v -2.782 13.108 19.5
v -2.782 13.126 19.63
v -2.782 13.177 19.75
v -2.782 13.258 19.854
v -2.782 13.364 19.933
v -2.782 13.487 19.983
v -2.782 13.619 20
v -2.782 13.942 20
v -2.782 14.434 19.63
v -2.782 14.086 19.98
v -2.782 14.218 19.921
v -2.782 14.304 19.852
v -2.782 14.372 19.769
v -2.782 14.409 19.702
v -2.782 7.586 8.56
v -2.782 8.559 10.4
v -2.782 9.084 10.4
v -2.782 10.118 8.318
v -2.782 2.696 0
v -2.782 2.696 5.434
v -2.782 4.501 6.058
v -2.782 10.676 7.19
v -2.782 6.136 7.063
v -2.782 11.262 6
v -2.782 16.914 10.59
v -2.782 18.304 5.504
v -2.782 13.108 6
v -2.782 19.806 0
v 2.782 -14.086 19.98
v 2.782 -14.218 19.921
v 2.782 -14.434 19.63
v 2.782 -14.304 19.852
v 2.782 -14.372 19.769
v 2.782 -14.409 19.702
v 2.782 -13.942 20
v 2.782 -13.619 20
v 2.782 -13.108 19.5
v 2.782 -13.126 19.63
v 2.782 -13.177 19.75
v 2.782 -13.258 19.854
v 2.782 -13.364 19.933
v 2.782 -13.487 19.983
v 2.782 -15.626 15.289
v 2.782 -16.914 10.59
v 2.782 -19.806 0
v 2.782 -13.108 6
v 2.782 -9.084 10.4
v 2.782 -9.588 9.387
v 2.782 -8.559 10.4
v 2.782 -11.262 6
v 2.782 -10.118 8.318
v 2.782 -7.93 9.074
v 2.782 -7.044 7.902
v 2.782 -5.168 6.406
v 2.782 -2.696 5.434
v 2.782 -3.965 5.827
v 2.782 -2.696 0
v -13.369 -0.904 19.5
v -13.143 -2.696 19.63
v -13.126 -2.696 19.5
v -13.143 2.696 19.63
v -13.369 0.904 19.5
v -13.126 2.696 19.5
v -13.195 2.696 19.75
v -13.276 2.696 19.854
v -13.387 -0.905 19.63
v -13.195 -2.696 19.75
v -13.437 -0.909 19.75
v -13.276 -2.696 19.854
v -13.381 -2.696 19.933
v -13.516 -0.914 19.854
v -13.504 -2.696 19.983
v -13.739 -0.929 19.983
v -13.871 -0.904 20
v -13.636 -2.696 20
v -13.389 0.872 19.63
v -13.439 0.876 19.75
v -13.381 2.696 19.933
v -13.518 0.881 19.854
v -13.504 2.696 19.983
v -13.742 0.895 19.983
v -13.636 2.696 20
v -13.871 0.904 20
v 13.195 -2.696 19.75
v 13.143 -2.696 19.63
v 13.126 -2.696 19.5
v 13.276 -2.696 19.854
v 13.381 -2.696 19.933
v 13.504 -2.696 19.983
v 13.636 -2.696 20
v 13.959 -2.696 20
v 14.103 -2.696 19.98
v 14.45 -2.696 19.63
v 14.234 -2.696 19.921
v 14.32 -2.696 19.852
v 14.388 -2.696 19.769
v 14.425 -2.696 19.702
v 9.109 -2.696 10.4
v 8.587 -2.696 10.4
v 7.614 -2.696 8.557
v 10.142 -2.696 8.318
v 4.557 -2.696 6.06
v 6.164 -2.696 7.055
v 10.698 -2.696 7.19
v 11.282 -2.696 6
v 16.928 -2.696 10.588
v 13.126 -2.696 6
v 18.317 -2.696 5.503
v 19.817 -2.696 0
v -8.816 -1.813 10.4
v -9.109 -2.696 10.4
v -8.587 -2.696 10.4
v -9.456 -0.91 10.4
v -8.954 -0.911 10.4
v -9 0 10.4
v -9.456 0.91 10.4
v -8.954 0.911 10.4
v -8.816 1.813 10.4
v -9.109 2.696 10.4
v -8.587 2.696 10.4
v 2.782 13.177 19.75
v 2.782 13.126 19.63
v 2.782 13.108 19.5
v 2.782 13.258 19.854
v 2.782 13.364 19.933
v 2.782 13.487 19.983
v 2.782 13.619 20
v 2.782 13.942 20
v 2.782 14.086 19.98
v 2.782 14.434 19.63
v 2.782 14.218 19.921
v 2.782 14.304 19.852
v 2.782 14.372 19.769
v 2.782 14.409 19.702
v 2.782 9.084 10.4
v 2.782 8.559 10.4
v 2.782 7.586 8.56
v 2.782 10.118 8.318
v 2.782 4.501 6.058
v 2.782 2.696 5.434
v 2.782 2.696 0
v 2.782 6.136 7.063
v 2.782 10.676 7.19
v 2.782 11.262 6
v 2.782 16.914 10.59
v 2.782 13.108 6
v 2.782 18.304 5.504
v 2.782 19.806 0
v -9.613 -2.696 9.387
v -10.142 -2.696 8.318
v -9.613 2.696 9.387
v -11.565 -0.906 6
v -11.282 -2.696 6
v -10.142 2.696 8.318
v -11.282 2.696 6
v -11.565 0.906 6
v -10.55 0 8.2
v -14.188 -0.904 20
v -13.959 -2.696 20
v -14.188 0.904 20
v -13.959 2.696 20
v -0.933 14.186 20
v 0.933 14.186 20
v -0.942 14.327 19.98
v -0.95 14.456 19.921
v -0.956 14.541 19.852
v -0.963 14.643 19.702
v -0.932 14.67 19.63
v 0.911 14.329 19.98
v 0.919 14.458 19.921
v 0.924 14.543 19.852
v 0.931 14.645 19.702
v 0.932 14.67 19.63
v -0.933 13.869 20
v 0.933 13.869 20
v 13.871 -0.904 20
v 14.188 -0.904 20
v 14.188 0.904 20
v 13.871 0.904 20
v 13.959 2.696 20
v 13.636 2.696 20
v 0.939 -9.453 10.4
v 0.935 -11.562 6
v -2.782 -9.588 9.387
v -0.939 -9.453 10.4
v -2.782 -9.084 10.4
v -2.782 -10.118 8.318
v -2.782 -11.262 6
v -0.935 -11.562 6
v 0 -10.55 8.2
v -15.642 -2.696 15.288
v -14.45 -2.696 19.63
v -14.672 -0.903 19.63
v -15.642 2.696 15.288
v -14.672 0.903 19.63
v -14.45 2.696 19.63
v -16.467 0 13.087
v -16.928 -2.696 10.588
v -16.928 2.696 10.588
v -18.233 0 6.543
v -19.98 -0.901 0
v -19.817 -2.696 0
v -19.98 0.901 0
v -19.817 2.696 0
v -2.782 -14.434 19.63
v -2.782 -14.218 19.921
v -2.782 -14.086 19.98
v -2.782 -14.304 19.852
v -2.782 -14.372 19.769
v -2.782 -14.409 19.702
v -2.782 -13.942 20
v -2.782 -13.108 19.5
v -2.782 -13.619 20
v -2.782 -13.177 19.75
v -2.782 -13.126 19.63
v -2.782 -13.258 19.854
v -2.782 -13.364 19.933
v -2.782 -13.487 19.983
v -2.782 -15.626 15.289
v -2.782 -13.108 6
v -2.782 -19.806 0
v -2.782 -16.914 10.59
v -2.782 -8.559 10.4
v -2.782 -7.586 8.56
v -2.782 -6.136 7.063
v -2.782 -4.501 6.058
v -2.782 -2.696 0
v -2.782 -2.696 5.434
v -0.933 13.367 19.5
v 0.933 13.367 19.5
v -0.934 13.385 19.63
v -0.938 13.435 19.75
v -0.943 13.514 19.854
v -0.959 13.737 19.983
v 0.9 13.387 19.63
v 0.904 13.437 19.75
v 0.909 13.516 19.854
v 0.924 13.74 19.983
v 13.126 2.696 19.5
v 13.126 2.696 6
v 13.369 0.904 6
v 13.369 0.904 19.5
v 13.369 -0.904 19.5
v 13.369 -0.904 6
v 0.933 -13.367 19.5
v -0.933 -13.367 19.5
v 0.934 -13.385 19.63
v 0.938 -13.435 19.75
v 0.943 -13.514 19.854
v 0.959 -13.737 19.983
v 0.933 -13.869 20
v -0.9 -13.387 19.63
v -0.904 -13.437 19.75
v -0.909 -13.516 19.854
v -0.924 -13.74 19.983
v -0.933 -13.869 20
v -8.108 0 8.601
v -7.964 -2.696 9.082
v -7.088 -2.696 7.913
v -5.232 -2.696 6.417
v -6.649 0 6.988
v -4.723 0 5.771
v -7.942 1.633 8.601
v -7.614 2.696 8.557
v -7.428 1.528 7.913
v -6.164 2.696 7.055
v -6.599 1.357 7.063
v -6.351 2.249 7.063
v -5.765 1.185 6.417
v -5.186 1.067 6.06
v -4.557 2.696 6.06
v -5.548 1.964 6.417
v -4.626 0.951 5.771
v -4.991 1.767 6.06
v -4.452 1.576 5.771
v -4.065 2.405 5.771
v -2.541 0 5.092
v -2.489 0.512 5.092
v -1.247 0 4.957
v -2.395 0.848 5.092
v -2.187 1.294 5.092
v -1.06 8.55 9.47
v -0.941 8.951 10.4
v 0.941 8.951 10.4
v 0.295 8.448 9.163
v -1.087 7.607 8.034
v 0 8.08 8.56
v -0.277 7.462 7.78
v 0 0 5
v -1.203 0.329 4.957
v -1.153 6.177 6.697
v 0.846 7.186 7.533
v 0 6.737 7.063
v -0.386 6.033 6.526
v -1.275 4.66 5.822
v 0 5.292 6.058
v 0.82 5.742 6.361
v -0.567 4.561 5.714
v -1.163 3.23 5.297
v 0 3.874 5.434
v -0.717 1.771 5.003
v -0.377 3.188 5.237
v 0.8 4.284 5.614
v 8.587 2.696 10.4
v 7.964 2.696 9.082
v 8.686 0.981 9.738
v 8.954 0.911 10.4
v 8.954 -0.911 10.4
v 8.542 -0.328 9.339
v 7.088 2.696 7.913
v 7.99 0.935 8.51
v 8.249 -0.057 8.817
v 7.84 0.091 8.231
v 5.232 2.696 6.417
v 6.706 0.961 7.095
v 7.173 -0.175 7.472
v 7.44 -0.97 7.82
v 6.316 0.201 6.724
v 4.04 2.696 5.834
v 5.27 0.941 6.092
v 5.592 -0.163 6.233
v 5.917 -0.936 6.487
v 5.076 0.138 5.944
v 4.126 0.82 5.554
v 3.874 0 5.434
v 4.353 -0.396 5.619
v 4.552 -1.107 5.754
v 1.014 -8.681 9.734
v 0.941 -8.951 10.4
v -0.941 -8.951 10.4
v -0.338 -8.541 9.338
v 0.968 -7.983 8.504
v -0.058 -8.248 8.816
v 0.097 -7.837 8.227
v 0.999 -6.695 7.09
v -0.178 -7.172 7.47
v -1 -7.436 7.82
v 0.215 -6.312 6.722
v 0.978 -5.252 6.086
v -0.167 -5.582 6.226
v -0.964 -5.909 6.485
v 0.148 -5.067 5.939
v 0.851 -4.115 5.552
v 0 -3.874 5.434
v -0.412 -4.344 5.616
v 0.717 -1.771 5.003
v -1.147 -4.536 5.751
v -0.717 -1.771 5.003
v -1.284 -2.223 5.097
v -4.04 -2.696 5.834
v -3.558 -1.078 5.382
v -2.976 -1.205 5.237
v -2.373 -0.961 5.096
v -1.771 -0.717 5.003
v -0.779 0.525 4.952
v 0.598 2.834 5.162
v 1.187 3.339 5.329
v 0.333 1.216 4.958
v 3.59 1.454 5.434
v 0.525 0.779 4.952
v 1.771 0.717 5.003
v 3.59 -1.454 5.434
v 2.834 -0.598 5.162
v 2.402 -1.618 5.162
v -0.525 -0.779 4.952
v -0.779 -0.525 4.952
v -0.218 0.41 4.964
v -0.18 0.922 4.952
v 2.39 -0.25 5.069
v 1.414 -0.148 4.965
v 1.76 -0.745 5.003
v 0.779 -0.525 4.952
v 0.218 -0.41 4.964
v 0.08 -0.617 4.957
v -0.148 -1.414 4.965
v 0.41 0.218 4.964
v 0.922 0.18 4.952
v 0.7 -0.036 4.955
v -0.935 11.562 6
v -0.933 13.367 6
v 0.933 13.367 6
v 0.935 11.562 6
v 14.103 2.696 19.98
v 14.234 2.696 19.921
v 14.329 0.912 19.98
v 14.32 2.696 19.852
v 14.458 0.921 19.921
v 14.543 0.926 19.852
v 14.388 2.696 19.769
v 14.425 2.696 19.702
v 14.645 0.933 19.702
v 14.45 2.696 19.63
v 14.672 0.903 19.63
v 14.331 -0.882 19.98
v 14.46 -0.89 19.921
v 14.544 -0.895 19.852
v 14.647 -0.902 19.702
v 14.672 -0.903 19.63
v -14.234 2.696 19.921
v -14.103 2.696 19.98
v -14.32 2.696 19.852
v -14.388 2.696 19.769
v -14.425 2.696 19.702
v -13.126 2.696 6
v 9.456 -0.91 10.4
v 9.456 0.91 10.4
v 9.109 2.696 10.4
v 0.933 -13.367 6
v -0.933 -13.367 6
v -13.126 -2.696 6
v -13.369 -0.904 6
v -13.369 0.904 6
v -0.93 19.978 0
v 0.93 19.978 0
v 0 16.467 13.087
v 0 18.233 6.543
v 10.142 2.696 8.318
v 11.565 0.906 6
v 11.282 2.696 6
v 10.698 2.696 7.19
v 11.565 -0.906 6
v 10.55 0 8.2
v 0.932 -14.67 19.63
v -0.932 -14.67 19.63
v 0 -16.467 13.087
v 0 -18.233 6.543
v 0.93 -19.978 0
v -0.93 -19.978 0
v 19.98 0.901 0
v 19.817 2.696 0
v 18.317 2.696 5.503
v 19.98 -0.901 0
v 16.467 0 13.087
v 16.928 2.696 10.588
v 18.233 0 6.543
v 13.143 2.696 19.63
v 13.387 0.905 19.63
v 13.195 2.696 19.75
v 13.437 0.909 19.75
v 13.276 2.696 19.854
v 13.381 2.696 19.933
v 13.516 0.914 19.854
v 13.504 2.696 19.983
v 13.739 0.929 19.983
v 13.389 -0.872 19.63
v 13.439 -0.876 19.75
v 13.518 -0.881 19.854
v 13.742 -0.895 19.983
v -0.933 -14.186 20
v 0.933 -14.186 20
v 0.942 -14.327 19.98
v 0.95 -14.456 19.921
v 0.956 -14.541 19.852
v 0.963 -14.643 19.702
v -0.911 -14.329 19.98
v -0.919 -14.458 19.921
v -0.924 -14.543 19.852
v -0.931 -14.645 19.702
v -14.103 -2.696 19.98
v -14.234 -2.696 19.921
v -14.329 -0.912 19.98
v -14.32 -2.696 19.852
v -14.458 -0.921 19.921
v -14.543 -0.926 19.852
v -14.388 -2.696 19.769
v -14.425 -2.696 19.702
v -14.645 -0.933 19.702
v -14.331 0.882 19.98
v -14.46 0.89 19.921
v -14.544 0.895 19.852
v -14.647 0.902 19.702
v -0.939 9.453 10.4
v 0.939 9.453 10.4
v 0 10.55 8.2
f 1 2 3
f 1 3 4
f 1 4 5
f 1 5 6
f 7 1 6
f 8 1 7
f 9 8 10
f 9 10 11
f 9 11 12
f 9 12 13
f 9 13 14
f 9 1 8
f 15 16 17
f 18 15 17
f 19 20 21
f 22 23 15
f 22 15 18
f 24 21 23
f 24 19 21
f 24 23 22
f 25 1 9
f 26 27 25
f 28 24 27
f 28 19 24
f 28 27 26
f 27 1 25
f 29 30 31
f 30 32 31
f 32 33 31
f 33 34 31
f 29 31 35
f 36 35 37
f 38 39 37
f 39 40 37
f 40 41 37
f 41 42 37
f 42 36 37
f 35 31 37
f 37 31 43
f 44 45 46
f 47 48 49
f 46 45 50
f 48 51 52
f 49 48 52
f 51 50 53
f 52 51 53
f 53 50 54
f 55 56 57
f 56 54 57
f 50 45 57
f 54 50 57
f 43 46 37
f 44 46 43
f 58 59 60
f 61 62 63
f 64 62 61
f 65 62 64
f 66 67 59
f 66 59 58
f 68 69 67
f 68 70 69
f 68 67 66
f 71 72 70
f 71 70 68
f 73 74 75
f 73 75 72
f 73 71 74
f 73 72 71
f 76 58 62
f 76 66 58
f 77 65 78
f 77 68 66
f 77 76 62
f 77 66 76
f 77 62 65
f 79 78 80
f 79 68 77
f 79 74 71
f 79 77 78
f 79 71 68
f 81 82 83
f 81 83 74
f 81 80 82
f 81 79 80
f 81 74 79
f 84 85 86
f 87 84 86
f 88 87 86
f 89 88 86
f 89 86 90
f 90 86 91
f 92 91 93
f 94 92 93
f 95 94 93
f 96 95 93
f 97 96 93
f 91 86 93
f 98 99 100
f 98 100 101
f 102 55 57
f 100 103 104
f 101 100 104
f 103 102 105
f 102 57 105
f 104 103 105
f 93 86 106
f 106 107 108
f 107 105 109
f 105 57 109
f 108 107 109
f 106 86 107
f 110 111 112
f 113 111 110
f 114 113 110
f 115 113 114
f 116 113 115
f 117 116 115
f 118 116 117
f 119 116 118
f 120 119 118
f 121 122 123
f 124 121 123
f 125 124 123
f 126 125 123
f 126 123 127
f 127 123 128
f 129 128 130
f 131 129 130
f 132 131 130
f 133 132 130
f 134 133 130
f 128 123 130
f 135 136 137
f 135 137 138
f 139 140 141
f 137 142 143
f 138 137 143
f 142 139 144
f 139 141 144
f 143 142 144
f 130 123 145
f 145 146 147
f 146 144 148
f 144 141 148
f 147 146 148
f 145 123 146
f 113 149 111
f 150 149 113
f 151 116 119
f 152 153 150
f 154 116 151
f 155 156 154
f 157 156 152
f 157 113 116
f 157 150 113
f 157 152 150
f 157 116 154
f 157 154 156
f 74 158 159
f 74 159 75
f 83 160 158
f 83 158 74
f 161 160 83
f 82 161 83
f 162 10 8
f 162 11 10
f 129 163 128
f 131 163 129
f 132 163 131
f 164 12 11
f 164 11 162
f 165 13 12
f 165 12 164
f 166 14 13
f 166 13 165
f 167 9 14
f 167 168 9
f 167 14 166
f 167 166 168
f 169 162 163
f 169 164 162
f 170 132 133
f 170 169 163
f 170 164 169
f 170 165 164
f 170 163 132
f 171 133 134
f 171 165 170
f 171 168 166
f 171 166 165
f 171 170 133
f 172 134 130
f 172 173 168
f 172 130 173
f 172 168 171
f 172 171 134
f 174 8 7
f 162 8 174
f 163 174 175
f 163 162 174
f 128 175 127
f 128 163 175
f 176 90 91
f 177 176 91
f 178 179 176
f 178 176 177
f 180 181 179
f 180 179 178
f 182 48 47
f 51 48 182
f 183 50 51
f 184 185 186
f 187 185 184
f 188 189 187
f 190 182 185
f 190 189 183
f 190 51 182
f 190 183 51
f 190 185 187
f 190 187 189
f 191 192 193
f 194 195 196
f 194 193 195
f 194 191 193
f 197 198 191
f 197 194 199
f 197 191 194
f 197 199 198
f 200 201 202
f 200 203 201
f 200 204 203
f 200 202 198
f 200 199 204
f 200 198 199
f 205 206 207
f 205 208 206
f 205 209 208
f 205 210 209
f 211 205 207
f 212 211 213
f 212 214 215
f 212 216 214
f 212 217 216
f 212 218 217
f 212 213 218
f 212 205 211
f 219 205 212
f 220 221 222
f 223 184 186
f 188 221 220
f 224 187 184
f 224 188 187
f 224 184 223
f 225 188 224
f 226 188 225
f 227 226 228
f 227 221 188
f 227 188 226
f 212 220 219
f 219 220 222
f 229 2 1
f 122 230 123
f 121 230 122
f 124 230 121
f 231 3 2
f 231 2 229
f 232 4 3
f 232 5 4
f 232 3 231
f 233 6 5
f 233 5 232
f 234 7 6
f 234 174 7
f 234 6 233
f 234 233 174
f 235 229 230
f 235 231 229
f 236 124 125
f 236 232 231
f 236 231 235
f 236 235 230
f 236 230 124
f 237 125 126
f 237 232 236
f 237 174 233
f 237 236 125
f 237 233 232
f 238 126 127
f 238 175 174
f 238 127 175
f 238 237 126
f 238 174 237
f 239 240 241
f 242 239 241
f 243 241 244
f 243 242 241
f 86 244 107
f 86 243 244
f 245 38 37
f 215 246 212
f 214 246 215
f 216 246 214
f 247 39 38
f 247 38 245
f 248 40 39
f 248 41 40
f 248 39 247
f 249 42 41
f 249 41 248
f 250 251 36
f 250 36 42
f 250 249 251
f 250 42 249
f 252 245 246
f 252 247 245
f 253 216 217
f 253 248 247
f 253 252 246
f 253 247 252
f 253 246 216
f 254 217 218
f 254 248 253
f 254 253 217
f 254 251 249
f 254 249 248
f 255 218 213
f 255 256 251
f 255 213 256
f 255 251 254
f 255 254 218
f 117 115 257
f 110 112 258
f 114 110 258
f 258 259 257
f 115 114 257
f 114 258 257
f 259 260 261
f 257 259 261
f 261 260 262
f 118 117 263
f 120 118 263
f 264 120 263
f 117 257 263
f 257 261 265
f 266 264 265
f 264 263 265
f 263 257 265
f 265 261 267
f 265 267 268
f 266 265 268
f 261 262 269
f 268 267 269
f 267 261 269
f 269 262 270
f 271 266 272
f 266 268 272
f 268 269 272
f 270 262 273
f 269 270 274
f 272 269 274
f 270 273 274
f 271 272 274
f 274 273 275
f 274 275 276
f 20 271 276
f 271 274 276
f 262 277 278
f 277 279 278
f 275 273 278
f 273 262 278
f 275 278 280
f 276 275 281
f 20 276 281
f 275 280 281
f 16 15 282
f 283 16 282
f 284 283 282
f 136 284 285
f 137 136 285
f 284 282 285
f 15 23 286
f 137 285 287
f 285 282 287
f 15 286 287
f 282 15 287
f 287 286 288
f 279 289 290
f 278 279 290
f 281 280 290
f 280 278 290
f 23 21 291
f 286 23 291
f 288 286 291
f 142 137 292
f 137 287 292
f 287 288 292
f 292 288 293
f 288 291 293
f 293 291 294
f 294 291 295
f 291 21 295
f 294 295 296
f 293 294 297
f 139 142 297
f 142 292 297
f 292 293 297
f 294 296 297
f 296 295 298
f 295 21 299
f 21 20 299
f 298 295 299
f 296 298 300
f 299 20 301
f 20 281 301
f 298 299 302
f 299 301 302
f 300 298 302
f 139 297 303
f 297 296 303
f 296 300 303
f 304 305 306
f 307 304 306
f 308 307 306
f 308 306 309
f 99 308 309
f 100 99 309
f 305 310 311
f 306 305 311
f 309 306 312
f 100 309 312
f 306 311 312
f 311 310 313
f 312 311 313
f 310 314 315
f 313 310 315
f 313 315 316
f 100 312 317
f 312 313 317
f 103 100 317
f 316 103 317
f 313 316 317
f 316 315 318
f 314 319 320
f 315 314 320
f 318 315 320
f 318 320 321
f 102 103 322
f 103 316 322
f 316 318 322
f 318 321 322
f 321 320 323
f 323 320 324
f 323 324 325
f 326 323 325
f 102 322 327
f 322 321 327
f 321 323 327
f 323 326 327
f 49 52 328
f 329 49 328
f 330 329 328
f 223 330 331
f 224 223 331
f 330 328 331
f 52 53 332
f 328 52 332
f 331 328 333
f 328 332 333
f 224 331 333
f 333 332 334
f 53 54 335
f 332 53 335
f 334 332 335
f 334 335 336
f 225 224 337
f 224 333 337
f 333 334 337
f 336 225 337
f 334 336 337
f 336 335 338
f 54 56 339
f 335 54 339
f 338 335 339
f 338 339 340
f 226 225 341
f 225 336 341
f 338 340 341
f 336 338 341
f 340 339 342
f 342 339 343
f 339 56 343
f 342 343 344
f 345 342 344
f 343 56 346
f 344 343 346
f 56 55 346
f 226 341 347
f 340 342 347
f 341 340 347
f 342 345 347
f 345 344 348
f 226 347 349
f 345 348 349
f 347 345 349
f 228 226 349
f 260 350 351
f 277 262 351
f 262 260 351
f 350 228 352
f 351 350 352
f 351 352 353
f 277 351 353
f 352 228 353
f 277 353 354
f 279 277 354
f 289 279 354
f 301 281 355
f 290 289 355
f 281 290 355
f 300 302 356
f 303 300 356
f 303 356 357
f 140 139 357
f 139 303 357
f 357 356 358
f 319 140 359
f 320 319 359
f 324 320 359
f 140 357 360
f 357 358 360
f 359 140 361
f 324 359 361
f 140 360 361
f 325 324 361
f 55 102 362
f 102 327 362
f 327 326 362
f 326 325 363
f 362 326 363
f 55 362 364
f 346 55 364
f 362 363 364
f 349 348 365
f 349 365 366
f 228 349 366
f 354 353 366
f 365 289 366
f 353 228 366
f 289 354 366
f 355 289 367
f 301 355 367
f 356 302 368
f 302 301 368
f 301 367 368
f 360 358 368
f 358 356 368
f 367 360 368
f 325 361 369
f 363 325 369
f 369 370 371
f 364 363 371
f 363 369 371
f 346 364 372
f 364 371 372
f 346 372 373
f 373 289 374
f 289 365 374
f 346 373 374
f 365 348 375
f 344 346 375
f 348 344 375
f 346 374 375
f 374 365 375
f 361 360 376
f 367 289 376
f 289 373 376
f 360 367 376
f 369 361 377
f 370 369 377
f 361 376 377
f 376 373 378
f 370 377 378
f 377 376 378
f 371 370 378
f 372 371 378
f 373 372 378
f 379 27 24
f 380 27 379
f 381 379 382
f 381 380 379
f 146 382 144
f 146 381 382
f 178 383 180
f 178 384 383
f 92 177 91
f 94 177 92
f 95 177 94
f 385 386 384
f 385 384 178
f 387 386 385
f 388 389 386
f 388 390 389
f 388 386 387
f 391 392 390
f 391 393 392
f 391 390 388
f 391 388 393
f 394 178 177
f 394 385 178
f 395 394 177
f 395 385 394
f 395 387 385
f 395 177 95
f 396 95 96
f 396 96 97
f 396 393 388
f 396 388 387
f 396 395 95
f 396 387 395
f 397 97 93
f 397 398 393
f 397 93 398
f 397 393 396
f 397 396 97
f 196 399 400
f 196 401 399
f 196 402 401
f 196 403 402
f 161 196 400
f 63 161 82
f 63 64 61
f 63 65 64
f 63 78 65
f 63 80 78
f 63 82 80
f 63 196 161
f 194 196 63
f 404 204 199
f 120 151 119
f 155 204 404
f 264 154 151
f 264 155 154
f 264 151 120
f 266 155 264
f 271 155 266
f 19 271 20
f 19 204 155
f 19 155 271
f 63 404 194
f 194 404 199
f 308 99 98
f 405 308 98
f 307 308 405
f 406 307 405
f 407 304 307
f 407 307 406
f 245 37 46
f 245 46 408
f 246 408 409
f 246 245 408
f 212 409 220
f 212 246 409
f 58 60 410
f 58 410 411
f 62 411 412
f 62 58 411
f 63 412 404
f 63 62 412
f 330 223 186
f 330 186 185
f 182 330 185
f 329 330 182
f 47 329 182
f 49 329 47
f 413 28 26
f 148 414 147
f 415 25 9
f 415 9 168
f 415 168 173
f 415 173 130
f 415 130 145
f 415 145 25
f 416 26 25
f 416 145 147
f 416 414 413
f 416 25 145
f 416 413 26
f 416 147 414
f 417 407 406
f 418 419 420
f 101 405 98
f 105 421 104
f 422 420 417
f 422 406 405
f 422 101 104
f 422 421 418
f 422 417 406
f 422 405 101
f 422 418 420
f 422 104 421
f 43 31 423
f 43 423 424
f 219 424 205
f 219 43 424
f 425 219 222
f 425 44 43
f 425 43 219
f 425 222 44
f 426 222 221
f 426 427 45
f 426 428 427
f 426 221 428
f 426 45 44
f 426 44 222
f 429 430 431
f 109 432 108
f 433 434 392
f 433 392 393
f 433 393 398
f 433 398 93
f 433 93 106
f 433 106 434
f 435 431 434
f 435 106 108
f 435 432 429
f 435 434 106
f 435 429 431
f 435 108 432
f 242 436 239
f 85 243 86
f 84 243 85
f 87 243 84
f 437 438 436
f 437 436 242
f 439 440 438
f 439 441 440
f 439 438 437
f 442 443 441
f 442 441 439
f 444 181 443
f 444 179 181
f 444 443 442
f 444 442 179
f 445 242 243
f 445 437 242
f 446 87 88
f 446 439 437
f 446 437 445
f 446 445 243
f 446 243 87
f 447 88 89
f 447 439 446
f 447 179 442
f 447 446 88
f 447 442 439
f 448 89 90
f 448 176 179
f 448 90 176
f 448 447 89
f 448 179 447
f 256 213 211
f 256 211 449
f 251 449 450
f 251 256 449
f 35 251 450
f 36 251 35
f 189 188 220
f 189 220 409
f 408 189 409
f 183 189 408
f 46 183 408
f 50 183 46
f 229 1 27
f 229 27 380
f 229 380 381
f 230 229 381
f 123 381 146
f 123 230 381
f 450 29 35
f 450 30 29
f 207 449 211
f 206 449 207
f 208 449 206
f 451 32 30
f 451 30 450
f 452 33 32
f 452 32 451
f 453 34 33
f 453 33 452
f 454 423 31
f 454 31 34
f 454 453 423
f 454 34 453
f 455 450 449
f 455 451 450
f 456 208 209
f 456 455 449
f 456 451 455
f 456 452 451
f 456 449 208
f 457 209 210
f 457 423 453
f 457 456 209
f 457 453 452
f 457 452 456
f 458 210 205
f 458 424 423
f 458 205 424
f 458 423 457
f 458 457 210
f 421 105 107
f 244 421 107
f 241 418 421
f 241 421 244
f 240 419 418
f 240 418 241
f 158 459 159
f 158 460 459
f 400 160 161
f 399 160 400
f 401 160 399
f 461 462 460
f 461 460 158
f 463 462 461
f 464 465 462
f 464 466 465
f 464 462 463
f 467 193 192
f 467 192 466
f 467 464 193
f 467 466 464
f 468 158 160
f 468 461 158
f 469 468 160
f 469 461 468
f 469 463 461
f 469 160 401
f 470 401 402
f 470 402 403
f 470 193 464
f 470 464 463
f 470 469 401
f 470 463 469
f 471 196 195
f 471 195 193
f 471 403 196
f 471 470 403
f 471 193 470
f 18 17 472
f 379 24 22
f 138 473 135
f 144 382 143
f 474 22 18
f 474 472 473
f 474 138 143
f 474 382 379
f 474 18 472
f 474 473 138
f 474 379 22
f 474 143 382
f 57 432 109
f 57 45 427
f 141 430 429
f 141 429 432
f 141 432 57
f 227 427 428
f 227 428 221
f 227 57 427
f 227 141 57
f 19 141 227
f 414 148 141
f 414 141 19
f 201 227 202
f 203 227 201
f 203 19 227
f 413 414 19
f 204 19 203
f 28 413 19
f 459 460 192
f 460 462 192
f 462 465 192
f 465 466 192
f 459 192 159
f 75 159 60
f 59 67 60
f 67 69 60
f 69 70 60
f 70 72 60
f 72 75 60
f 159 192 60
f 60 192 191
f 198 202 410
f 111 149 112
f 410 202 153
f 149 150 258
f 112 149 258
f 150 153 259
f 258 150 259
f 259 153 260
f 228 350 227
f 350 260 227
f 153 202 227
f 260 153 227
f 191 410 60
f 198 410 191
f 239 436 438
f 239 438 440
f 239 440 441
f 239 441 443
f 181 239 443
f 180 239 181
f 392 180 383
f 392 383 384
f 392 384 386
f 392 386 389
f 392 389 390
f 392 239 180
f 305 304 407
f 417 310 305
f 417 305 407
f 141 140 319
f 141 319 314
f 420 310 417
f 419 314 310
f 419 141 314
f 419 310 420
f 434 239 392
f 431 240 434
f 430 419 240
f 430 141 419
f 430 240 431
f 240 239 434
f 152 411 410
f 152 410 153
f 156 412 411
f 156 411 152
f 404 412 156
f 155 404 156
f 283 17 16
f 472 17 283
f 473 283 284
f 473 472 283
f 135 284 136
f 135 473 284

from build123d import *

# Parameters (mm, degrees)
F2_R     = 0.5
F3_W     = 21.0270890966
F3_H     = 19.3190067075
F4_DEPTH = 25


with BuildPart() as f1:
    # F0 (on Front) → F1 (revolve)
    with BuildSketch(Plane.XZ):
        with BuildLine():
            Line((-20, 0), (0, 0))
            Line((0, 0), (0, 5))
            add(Edge.make_bspline(
                [(-9, 10.4), (-6.953539399, 4.2876302106), (0, 5)],
                knots=[3.4384028692, 3.4384028692, 3.4384028692, 4.8240705554, 4.8240705554, 4.8240705554], degree=2, weights=[1, 0.7694390741, 1]))
            Line((-9, 10.4), (-9.5, 10.4))
            Line((-9.5, 10.4), (-11.6, 6))
            Line((-11.6, 6), (-13.4, 6))
            Line((-13.4, 6), (-13.4, 20))
            Line((-13.4, 20), (-14.6, 20))
            Line((-14.6, 20), (-20, 0))
        make_face()
    revolve(axis=Axis((0, 0, 2.5), (0, 0, -1)))

    # F2
    f2_edges = [f1.edges().sort_by_distance(p)[0] for p in [
        (14.6, 0, 20),
        (13.4, 0, 20),
    ]]
    fillet(f2_edges, radius=F2_R)

    # F3 (on Top) → F4 (cut)
    with BuildSketch(Plane.XY):
        with Locations((-13.2951806299, 12.3554796446)):
            Rectangle(F3_W, F3_H)
        with Locations((13.2951806299, 12.3554796446)):
            Rectangle(F3_W, F3_H)
        with Locations((-13.2951806299, -12.3554796446)):
            Rectangle(F3_W, F3_H)
        with Locations((13.2951806299, -12.3554796446)):
            Rectangle(F3_W, F3_H)
    extrude(amount=F4_DEPTH, mode=Mode.SUBTRACT)


solid = f1.part
